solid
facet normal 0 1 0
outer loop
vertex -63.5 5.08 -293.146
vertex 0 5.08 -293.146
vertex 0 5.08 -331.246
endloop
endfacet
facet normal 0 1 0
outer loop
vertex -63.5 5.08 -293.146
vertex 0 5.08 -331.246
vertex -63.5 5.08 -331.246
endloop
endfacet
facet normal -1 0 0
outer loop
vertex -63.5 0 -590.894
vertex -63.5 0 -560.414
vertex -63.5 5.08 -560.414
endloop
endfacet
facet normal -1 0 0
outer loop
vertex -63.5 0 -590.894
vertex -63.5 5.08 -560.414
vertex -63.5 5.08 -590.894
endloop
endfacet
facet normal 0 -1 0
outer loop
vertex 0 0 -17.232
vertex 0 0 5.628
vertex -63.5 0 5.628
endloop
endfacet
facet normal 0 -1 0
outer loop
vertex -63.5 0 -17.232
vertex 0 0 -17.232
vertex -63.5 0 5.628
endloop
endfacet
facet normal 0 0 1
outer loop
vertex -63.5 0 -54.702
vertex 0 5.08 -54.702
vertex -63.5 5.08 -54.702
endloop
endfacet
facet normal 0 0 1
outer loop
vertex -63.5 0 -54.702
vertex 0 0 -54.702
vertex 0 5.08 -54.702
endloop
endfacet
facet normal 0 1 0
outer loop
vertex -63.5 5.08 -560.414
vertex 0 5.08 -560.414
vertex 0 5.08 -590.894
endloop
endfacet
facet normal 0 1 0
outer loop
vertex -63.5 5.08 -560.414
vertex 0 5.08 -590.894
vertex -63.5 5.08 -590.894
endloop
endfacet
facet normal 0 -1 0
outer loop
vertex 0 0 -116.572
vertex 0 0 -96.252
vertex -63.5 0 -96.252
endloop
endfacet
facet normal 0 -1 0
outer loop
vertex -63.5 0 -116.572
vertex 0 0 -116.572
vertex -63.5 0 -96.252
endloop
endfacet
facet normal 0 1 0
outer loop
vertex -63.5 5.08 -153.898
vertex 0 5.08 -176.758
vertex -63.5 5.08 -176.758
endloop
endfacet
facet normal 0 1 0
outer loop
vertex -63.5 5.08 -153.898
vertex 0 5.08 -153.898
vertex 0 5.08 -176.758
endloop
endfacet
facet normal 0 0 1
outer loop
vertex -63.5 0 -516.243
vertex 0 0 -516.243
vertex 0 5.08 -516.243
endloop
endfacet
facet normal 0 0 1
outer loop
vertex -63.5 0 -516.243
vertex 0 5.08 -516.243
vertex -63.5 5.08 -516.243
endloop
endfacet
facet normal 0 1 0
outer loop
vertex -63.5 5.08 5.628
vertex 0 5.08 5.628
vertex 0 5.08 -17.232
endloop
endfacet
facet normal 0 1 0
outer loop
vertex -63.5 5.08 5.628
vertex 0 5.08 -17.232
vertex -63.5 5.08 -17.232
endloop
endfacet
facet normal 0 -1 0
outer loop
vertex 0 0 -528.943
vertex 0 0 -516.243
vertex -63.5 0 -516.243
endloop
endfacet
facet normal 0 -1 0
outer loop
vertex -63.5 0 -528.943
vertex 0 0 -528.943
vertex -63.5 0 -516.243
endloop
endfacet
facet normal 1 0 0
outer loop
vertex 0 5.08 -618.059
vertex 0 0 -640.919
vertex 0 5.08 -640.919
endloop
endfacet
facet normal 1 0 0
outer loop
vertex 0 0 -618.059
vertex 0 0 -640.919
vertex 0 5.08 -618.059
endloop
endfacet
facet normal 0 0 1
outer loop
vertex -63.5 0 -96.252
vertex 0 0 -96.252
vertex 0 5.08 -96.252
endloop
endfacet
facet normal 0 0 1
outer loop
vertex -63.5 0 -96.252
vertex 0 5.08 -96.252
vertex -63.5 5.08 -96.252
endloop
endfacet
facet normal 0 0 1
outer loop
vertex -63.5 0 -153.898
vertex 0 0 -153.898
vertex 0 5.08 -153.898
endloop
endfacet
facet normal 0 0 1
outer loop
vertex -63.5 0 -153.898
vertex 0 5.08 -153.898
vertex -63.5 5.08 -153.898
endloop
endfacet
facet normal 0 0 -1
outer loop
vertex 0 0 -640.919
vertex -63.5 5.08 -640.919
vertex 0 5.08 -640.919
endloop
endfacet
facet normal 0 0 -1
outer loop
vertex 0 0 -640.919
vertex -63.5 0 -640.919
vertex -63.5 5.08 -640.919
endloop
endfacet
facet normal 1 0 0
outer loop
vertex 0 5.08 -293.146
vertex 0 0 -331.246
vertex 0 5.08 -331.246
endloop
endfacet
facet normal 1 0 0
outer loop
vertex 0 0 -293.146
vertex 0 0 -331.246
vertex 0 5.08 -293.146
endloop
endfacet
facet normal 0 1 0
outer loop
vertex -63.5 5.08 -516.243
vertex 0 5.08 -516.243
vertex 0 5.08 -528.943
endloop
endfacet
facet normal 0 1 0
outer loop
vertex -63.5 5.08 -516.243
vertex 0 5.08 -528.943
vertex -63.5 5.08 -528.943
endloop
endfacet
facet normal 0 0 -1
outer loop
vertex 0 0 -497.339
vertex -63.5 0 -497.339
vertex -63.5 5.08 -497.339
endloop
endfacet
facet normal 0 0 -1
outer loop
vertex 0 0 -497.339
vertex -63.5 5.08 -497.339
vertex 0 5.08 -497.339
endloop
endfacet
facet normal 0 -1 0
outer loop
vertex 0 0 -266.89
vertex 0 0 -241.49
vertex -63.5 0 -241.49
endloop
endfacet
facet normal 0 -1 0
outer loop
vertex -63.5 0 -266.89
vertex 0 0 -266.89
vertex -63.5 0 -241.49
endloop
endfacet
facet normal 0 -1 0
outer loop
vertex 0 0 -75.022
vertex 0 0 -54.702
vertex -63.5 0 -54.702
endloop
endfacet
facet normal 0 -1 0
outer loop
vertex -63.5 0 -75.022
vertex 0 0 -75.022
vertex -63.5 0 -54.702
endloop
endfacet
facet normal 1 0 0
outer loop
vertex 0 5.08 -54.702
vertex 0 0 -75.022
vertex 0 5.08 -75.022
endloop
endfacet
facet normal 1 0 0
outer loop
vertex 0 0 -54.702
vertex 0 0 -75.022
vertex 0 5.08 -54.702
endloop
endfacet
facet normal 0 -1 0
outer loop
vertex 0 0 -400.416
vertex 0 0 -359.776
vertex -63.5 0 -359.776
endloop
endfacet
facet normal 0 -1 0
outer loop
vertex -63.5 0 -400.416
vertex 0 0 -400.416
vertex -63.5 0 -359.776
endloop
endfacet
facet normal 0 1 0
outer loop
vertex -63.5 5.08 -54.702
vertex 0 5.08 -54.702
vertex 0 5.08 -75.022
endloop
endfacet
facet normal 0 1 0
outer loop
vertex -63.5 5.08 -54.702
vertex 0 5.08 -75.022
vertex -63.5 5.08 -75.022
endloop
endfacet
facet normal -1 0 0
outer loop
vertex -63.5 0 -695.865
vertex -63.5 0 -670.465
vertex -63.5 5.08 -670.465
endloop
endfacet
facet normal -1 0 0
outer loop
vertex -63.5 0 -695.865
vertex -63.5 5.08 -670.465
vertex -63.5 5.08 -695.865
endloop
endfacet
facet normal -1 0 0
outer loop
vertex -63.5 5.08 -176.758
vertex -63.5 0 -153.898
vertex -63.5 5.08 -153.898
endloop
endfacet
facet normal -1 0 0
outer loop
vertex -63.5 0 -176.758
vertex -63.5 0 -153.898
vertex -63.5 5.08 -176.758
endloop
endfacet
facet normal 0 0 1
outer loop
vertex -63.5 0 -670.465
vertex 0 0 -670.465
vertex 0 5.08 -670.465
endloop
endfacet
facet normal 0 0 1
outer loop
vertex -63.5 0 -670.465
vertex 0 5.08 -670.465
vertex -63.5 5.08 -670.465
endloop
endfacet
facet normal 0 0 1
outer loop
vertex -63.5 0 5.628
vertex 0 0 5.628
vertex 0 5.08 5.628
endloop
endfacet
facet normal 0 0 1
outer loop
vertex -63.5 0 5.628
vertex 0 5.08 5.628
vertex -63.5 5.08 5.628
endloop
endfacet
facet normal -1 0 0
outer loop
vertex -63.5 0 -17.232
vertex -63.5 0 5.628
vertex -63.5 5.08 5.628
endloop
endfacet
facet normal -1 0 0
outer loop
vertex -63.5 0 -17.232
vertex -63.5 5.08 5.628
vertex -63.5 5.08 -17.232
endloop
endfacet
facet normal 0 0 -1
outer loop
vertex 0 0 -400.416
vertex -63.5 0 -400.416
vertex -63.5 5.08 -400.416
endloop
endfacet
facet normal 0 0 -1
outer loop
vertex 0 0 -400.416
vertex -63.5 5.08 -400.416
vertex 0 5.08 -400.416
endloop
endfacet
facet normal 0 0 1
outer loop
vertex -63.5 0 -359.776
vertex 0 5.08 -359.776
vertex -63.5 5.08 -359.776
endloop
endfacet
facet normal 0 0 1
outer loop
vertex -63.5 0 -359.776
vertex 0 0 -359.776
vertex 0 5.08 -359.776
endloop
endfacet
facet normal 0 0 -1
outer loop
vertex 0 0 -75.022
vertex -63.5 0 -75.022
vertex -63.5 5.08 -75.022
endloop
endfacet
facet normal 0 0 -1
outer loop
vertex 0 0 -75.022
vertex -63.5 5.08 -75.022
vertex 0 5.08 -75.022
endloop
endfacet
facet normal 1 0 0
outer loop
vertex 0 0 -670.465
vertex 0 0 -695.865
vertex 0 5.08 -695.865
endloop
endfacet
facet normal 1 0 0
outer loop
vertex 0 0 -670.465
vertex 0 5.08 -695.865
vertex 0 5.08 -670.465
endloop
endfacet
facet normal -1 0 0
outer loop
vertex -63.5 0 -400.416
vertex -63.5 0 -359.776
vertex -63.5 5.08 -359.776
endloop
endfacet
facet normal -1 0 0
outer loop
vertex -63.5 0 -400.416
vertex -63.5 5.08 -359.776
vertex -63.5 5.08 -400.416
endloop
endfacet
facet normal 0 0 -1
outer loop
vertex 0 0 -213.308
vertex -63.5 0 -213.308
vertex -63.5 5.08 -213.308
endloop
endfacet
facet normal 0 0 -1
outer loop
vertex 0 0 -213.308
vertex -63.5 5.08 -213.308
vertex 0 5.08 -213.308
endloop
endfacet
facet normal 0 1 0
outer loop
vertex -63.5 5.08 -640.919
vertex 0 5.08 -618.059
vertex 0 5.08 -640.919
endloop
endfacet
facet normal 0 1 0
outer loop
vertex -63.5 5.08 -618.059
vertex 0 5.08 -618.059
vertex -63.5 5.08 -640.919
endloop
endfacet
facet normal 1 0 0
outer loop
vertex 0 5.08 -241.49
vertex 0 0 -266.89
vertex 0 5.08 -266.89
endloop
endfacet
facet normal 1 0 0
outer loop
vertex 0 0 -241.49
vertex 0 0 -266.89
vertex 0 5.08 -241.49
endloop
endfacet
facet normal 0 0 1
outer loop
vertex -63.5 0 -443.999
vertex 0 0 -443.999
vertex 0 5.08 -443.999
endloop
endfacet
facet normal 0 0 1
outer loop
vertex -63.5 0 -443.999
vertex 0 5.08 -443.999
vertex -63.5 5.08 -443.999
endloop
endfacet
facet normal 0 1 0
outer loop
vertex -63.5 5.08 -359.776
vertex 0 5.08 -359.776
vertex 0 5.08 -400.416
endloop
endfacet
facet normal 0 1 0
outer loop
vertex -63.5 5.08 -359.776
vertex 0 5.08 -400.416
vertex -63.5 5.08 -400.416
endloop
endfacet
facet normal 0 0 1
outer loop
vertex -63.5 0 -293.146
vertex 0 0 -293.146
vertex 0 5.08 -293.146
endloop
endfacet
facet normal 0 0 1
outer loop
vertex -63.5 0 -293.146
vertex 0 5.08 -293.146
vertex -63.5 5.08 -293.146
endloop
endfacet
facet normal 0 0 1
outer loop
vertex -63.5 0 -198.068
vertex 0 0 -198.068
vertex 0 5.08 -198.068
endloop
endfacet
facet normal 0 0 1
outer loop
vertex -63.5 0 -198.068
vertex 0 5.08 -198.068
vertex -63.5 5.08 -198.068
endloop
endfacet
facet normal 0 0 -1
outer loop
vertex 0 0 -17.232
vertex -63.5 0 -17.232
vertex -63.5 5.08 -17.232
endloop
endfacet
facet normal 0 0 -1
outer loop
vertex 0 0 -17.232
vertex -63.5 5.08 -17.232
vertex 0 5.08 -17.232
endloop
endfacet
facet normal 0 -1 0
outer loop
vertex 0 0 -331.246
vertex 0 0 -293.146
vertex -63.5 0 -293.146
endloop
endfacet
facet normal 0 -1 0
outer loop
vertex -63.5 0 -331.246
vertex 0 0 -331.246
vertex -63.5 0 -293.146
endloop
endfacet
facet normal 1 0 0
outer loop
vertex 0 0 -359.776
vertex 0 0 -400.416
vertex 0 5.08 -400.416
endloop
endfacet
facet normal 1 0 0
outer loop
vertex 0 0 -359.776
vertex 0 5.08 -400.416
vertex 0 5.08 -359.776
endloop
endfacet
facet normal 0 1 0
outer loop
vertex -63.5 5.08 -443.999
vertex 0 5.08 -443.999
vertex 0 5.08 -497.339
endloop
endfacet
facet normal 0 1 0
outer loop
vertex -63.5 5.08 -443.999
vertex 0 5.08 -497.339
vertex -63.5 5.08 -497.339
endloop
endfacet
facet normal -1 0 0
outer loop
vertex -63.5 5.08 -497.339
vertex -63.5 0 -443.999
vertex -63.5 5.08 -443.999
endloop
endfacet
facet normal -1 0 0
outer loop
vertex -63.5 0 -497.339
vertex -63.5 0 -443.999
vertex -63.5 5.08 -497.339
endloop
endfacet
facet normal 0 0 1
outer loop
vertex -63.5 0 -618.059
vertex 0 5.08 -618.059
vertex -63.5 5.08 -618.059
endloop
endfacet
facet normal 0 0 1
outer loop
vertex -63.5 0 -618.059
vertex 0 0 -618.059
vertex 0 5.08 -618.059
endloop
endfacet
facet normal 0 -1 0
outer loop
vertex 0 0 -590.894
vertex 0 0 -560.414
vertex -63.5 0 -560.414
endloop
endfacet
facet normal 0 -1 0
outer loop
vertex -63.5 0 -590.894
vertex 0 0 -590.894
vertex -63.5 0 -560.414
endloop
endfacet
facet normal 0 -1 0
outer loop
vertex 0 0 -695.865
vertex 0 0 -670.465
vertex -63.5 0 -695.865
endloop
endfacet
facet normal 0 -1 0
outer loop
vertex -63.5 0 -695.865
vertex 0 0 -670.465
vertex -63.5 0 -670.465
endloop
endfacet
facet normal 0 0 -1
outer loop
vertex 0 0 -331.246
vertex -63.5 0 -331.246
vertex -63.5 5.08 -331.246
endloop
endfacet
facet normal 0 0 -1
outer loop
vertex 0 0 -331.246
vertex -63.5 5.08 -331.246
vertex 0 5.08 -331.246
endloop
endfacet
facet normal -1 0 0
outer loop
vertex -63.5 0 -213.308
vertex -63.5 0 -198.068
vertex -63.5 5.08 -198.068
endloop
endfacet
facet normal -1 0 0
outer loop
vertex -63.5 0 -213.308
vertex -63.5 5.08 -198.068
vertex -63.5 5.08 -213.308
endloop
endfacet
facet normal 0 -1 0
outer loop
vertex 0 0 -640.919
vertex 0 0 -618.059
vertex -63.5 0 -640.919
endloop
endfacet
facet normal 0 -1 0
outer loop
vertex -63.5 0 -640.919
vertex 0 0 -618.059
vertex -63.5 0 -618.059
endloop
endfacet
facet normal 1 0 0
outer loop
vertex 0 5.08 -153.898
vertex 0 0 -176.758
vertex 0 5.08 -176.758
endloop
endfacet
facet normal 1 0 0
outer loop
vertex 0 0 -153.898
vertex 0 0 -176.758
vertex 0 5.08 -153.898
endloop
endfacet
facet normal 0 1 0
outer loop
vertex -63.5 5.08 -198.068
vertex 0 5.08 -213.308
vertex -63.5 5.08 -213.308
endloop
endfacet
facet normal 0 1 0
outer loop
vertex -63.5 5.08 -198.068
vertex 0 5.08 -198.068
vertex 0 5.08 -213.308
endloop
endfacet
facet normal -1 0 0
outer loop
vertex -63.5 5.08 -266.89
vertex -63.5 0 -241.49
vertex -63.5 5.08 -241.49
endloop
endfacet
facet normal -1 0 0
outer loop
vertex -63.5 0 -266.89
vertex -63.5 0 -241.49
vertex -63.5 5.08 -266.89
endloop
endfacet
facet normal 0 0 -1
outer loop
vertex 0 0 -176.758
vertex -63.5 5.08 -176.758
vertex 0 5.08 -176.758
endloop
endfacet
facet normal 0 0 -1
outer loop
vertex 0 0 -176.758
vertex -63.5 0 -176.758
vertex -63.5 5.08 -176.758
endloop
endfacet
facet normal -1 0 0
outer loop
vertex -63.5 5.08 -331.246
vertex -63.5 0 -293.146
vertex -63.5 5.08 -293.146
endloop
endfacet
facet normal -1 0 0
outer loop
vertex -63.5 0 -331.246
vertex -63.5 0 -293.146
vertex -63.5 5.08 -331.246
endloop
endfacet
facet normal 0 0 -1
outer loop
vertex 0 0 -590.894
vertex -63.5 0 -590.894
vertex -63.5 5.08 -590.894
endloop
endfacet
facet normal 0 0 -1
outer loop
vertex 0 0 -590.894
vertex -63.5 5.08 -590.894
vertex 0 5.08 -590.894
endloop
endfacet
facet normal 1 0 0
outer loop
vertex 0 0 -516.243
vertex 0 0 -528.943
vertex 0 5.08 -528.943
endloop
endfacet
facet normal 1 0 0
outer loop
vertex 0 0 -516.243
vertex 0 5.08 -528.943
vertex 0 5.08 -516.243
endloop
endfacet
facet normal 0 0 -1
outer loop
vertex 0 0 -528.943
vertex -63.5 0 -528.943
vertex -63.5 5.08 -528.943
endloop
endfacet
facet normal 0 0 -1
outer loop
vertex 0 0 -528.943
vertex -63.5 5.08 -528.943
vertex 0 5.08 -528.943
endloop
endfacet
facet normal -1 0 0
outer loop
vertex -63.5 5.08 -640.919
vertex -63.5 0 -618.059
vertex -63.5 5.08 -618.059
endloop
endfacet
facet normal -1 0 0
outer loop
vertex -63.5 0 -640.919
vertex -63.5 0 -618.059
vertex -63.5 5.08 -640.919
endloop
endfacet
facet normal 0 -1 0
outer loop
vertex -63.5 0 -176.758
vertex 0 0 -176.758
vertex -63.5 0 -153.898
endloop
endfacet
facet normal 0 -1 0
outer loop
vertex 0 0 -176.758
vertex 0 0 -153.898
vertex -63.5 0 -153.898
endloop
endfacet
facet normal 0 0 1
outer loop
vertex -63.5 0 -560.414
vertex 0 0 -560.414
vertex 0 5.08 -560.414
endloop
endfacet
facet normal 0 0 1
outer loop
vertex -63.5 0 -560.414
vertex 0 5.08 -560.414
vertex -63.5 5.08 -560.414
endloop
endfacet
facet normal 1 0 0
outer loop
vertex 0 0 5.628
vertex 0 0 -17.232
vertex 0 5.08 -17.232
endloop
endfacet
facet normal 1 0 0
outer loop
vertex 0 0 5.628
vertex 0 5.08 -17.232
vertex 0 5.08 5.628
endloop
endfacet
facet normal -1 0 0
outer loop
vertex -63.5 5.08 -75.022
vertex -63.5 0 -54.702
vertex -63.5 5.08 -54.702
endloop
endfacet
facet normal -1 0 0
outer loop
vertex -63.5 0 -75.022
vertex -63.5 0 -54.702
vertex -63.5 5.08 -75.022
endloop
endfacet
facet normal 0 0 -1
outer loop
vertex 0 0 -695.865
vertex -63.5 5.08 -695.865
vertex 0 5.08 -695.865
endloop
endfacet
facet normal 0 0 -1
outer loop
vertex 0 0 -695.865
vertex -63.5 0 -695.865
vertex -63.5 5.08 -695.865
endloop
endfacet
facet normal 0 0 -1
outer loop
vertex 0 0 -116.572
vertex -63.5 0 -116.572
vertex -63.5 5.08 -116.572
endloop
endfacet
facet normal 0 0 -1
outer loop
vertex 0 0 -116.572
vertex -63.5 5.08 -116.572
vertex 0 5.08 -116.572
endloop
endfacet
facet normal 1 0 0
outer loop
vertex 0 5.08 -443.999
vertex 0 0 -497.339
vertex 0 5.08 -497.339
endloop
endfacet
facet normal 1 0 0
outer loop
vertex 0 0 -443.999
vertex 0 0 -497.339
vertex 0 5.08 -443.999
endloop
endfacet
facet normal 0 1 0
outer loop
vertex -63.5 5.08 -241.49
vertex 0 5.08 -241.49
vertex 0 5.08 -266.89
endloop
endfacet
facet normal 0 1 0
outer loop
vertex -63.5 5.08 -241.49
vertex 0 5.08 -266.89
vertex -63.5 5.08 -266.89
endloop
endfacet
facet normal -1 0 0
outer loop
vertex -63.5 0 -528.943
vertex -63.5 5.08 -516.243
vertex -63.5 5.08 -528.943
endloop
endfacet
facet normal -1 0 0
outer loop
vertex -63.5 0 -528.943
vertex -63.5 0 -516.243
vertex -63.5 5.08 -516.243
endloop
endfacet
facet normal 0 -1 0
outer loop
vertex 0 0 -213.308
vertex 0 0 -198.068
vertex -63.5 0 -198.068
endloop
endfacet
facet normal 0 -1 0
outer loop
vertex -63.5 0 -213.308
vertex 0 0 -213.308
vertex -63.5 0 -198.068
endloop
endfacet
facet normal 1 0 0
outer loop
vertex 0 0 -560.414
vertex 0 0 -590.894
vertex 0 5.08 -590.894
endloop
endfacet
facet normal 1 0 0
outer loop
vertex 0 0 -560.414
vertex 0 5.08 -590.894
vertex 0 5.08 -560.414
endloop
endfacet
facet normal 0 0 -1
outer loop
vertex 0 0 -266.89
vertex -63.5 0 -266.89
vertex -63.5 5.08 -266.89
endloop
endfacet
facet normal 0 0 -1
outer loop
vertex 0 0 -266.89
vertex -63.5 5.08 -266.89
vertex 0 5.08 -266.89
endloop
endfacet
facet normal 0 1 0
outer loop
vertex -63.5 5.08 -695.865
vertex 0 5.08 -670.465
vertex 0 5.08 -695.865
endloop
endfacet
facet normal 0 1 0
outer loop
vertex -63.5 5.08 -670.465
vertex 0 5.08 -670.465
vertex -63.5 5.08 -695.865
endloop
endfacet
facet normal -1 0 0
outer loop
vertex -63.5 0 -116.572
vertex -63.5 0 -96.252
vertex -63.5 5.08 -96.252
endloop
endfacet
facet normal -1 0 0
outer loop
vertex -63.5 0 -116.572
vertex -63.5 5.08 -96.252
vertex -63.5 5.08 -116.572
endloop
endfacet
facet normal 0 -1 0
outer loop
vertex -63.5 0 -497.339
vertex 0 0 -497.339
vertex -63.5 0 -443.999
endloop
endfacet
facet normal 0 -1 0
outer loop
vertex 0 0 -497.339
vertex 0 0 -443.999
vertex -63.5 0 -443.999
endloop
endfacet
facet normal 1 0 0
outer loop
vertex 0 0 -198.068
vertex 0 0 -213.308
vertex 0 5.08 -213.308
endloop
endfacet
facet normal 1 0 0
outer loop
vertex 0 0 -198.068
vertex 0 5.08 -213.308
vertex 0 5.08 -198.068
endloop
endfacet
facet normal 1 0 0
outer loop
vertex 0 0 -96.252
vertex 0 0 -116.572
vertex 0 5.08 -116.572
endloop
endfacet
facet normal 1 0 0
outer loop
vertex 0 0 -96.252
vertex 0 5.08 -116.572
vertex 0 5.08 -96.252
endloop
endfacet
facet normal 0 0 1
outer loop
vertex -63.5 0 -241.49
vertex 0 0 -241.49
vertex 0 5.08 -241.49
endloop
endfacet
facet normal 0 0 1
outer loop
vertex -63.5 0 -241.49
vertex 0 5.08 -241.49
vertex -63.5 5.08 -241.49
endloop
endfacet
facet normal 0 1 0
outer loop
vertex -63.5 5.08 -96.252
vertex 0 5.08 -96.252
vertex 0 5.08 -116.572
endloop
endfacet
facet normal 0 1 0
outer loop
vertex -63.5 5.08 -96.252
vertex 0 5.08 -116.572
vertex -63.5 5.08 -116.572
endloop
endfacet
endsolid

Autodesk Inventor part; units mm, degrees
ref_plane "YZ Plane" through (0, 0, 0) normal (1, 0, 0) x (0, 1, 0)
ref_plane "XZ Plane" through (0, 0, 0) normal (0, 1, 0) x (-1, 0, 0)
ref_plane "XY Plane" through (0, 0, 0) normal (0, 0, 1) x (1, 0, 0)
sketch "Sketch1" plane through (0, 0, 0) normal (0, 1, 0) x (-1, 0, 0)
  line L0 (0, 5.628) -> (63.5, 5.628)
  line L1 (63.5, 5.628) -> (63.5, -17.232)
  line L2 (63.5, -17.232) -> (0, -17.232)
  line L3 (0, -17.232) -> (0, 5.628)
  line L4 (0, -54.7021) -> (63.5, -54.7021)
  line L5 (63.5, -54.7021) -> (63.5, -75.0221)
  line L6 (63.5, -75.0221) -> (0, -75.0221)
  line L7 (0, -75.0221) -> (0, -54.7021)
  line L8 (0, -96.252) -> (63.5, -96.252)
  line L9 (63.5, -96.252) -> (63.5, -116.572)
  line L10 (63.5, -116.572) -> (0, -116.572)
  line L11 (0, -116.572) -> (0, -96.252)
  line L12 (0, -153.8979) -> (63.5, -153.8979)
  line L13 (63.5, -153.8979) -> (63.5, -176.7579)
  line L14 (63.5, -176.7579) -> (0, -176.7579)
  line L15 (0, -176.7579) -> (0, -153.8979)
  line L16 (0, -198.0681) -> (63.5, -198.0681)
  line L17 (63.5, -198.0681) -> (63.5, -213.3081)
  line L18 (63.5, -213.3081) -> (0, -213.3081)
  line L19 (0, -213.3081) -> (0, -198.0681)
  line L20 (0, -241.4897) -> (63.5, -241.4897)
  line L21 (63.5, -241.4897) -> (63.5, -266.8897)
  line L22 (63.5, -266.8897) -> (0, -266.8897)
  line L23 (0, -266.8897) -> (0, -241.4897)
  line L24 (0, -293.1463) -> (63.5, -293.1463)
  line L25 (63.5, -293.1463) -> (63.5, -331.2463)
  line L26 (63.5, -331.2463) -> (0, -331.2463)
  line L27 (0, -331.2463) -> (0, -293.1463)
  line L28 (0, -359.776) -> (63.5, -359.776)
  line L29 (63.5, -359.776) -> (63.5, -400.416)
  line L30 (63.5, -400.416) -> (0, -400.416)
  line L31 (0, -400.416) -> (0, -359.776)
  line L32 (0, -443.9988) -> (63.5, -443.9988)
  line L33 (63.5, -443.9988) -> (63.5, -497.3388)
  line L34 (63.5, -497.3388) -> (0, -497.3388)
  line L35 (0, -497.3388) -> (0, -443.9988)
  line L36 (0, -516.2433) -> (63.5, -516.2433)
  line L37 (63.5, -516.2433) -> (63.5, -528.9433)
  line L38 (63.5, -528.9433) -> (0, -528.9433)
  line L39 (0, -528.9433) -> (0, -516.2433)
  line L40 (0, -560.4135) -> (63.5, -560.4135)
  line L41 (63.5, -560.4135) -> (63.5, -590.8935)
  line L42 (63.5, -590.8935) -> (0, -590.8935)
  line L43 (0, -590.8935) -> (0, -560.4135)
  line L44 (0, -618.0593) -> (63.5, -618.0593)
  line L45 (63.5, -618.0593) -> (63.5, -640.9193)
  line L46 (63.5, -640.9193) -> (0, -640.9193)
  line L47 (0, -640.9193) -> (0, -618.0593)
  line L48 (0, -670.4647) -> (63.5, -670.4647)
  line L49 (63.5, -670.4647) -> (63.5, -695.8647)
  line L50 (63.5, -695.8647) -> (0, -695.8647)
  line L51 (0, -695.8647) -> (0, -670.4647)
  point P0 (0, 0)
  dimension "d0" = 63.5
  dimension "d1" = 22.86
  dimension "d2" = 20.32
  dimension "d3" = 20.32
  dimension "d4" = 63.5
  dimension "d5" = 22.86
  dimension "d6" = 15.24
  dimension "d7" = 63.5
  dimension "d8" = 25.4
  dimension "d9" = 63.5
  dimension "d10" = 38.1
  dimension "d11" = 63.5
  dimension "d12" = 40.64
  dimension "d13" = 63.5
  dimension "d14" = 53.34
  dimension "d15" = 12.7
  dimension "d16" = 30.48
  dimension "d17" = 22.86
  dimension "d18" = 63.5
  dimension "d19" = 25.4
extrude "Extrusion1" add sketch "Sketch1" along normal blind 5.08
properties part number "1st floor interior wall print out"
